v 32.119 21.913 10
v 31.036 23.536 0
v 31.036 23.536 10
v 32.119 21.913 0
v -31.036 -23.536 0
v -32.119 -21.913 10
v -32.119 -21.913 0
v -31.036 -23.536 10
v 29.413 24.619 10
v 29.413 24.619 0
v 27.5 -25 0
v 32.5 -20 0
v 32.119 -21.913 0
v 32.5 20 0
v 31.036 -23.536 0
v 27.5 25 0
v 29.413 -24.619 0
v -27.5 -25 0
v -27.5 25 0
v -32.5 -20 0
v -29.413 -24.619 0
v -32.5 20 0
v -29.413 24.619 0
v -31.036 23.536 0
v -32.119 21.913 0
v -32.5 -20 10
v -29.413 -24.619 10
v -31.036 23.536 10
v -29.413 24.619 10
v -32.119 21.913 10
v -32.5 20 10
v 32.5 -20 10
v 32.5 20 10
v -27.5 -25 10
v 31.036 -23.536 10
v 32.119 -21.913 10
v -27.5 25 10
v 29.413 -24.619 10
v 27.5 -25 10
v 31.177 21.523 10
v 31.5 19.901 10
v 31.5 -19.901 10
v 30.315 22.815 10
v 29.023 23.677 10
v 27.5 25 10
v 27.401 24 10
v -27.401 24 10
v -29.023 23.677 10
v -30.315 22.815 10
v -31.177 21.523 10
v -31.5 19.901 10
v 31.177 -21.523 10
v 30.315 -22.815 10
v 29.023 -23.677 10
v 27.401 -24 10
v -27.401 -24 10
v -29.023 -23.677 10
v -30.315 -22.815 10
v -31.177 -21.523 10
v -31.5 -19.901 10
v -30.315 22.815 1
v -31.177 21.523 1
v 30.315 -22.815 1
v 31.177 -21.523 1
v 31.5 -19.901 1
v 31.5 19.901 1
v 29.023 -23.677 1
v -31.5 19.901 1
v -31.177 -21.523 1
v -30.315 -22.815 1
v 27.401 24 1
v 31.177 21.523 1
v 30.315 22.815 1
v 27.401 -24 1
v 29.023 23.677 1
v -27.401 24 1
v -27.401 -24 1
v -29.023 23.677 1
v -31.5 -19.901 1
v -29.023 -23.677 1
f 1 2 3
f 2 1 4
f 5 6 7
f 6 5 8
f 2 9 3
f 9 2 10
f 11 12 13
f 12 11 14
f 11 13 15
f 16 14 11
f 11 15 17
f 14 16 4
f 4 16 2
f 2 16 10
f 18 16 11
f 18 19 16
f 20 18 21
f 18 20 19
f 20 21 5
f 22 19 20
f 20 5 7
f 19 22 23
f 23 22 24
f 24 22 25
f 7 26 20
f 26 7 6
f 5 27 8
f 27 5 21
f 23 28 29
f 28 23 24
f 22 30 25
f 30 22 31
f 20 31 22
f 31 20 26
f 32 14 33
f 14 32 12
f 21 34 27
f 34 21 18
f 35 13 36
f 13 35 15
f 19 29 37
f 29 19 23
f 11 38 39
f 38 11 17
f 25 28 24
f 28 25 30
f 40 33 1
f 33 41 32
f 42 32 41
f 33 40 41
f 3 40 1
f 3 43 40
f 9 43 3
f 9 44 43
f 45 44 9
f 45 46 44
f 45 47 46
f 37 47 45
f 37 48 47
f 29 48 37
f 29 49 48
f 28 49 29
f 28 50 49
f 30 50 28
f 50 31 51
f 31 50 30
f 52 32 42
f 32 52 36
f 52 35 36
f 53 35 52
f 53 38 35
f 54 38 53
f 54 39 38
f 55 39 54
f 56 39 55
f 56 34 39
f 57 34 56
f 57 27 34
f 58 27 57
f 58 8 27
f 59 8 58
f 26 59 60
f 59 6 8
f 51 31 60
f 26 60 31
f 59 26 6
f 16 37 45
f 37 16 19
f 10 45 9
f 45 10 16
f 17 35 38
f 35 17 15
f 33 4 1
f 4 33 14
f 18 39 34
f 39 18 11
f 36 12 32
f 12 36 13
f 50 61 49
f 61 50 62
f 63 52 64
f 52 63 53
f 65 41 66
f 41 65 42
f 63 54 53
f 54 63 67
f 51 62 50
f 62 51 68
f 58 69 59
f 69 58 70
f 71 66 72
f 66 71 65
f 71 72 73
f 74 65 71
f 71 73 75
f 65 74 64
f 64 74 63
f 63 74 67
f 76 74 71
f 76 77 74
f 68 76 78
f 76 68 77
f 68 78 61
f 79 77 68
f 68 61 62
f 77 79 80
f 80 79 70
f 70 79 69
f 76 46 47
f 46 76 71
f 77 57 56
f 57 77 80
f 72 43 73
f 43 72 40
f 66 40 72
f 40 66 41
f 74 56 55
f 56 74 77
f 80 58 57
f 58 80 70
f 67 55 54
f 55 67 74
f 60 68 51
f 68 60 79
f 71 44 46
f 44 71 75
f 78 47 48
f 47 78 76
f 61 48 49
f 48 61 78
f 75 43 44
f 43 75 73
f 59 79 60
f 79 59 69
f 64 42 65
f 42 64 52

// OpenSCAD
// Outer Width
width = 65; // [0:1:200]

// Outer Depth
depth = 50; // [1:1:200]

// Outer Height
height = 10; // [1:1:200]

radius = 5; // [0:1:50]

wall = 1; // [0:0.5:5]

slot_a = 20;
slot_y = depth/3;

// Resolution
$fs = 2; // [1:High, 2:Medium, 4:Low]
$fa = 0.01 + 0;

part = "Box"; // [Box, Slot, Combined]

if (part == "Box") {
	box();
}
else if (part == "Slot") {
	difference() {
		slot();
		slot_negative();
	}
}
else if (part == "Combined") {
	difference() {
		union() {
			box();
			slot();
		}

		slot_negative();
	}
}

module slot(where="additive") {
	x = width*.75+wall*2;
	y = 5+wall*2;
	translate([0, -slot_y, 0])
		rotate(-slot_a, [1,0,0])
			translate([-x/2, 0, 0])
				cube([x, y, height*2]);
}
module slot_negative() {
	x = width*.75;
	y = 5;
	translate([0, -slot_y, 0]) {
		rotate(-slot_a, [1,0,0]) {
			translate([-x/2, wall, -1])
				cube([x, y, height*2+2]);    // Cutout Center
			translate([-width/2-1, wall, 0])
				cube([width+2, y, height]);  // Cutout Sides
		}
		translate([-width/2, 0, height+wall])
			cube([width, depth, height]);    // Flatten Top
		translate([-width/2, 0, -height])
			cube([width, depth, height]);    // Flatten Bottom
	}
}

module box() {
	difference() {
		linear_extrude(height)
			perimeter();

		translate([0, 0, wall])
			linear_extrude(height)
				offset(-wall)
					perimeter();
	}
}

module perimeter() {
	x = width/2-radius;
	y = depth/2-radius;
	hull() {
		translate([-x, +y, 0]) circle(radius);
		translate([+x, +y, 0]) circle(radius);
		translate([-x, -y, 0]) circle(radius);
		translate([+x, -y, 0]) circle(radius);
	};
}
